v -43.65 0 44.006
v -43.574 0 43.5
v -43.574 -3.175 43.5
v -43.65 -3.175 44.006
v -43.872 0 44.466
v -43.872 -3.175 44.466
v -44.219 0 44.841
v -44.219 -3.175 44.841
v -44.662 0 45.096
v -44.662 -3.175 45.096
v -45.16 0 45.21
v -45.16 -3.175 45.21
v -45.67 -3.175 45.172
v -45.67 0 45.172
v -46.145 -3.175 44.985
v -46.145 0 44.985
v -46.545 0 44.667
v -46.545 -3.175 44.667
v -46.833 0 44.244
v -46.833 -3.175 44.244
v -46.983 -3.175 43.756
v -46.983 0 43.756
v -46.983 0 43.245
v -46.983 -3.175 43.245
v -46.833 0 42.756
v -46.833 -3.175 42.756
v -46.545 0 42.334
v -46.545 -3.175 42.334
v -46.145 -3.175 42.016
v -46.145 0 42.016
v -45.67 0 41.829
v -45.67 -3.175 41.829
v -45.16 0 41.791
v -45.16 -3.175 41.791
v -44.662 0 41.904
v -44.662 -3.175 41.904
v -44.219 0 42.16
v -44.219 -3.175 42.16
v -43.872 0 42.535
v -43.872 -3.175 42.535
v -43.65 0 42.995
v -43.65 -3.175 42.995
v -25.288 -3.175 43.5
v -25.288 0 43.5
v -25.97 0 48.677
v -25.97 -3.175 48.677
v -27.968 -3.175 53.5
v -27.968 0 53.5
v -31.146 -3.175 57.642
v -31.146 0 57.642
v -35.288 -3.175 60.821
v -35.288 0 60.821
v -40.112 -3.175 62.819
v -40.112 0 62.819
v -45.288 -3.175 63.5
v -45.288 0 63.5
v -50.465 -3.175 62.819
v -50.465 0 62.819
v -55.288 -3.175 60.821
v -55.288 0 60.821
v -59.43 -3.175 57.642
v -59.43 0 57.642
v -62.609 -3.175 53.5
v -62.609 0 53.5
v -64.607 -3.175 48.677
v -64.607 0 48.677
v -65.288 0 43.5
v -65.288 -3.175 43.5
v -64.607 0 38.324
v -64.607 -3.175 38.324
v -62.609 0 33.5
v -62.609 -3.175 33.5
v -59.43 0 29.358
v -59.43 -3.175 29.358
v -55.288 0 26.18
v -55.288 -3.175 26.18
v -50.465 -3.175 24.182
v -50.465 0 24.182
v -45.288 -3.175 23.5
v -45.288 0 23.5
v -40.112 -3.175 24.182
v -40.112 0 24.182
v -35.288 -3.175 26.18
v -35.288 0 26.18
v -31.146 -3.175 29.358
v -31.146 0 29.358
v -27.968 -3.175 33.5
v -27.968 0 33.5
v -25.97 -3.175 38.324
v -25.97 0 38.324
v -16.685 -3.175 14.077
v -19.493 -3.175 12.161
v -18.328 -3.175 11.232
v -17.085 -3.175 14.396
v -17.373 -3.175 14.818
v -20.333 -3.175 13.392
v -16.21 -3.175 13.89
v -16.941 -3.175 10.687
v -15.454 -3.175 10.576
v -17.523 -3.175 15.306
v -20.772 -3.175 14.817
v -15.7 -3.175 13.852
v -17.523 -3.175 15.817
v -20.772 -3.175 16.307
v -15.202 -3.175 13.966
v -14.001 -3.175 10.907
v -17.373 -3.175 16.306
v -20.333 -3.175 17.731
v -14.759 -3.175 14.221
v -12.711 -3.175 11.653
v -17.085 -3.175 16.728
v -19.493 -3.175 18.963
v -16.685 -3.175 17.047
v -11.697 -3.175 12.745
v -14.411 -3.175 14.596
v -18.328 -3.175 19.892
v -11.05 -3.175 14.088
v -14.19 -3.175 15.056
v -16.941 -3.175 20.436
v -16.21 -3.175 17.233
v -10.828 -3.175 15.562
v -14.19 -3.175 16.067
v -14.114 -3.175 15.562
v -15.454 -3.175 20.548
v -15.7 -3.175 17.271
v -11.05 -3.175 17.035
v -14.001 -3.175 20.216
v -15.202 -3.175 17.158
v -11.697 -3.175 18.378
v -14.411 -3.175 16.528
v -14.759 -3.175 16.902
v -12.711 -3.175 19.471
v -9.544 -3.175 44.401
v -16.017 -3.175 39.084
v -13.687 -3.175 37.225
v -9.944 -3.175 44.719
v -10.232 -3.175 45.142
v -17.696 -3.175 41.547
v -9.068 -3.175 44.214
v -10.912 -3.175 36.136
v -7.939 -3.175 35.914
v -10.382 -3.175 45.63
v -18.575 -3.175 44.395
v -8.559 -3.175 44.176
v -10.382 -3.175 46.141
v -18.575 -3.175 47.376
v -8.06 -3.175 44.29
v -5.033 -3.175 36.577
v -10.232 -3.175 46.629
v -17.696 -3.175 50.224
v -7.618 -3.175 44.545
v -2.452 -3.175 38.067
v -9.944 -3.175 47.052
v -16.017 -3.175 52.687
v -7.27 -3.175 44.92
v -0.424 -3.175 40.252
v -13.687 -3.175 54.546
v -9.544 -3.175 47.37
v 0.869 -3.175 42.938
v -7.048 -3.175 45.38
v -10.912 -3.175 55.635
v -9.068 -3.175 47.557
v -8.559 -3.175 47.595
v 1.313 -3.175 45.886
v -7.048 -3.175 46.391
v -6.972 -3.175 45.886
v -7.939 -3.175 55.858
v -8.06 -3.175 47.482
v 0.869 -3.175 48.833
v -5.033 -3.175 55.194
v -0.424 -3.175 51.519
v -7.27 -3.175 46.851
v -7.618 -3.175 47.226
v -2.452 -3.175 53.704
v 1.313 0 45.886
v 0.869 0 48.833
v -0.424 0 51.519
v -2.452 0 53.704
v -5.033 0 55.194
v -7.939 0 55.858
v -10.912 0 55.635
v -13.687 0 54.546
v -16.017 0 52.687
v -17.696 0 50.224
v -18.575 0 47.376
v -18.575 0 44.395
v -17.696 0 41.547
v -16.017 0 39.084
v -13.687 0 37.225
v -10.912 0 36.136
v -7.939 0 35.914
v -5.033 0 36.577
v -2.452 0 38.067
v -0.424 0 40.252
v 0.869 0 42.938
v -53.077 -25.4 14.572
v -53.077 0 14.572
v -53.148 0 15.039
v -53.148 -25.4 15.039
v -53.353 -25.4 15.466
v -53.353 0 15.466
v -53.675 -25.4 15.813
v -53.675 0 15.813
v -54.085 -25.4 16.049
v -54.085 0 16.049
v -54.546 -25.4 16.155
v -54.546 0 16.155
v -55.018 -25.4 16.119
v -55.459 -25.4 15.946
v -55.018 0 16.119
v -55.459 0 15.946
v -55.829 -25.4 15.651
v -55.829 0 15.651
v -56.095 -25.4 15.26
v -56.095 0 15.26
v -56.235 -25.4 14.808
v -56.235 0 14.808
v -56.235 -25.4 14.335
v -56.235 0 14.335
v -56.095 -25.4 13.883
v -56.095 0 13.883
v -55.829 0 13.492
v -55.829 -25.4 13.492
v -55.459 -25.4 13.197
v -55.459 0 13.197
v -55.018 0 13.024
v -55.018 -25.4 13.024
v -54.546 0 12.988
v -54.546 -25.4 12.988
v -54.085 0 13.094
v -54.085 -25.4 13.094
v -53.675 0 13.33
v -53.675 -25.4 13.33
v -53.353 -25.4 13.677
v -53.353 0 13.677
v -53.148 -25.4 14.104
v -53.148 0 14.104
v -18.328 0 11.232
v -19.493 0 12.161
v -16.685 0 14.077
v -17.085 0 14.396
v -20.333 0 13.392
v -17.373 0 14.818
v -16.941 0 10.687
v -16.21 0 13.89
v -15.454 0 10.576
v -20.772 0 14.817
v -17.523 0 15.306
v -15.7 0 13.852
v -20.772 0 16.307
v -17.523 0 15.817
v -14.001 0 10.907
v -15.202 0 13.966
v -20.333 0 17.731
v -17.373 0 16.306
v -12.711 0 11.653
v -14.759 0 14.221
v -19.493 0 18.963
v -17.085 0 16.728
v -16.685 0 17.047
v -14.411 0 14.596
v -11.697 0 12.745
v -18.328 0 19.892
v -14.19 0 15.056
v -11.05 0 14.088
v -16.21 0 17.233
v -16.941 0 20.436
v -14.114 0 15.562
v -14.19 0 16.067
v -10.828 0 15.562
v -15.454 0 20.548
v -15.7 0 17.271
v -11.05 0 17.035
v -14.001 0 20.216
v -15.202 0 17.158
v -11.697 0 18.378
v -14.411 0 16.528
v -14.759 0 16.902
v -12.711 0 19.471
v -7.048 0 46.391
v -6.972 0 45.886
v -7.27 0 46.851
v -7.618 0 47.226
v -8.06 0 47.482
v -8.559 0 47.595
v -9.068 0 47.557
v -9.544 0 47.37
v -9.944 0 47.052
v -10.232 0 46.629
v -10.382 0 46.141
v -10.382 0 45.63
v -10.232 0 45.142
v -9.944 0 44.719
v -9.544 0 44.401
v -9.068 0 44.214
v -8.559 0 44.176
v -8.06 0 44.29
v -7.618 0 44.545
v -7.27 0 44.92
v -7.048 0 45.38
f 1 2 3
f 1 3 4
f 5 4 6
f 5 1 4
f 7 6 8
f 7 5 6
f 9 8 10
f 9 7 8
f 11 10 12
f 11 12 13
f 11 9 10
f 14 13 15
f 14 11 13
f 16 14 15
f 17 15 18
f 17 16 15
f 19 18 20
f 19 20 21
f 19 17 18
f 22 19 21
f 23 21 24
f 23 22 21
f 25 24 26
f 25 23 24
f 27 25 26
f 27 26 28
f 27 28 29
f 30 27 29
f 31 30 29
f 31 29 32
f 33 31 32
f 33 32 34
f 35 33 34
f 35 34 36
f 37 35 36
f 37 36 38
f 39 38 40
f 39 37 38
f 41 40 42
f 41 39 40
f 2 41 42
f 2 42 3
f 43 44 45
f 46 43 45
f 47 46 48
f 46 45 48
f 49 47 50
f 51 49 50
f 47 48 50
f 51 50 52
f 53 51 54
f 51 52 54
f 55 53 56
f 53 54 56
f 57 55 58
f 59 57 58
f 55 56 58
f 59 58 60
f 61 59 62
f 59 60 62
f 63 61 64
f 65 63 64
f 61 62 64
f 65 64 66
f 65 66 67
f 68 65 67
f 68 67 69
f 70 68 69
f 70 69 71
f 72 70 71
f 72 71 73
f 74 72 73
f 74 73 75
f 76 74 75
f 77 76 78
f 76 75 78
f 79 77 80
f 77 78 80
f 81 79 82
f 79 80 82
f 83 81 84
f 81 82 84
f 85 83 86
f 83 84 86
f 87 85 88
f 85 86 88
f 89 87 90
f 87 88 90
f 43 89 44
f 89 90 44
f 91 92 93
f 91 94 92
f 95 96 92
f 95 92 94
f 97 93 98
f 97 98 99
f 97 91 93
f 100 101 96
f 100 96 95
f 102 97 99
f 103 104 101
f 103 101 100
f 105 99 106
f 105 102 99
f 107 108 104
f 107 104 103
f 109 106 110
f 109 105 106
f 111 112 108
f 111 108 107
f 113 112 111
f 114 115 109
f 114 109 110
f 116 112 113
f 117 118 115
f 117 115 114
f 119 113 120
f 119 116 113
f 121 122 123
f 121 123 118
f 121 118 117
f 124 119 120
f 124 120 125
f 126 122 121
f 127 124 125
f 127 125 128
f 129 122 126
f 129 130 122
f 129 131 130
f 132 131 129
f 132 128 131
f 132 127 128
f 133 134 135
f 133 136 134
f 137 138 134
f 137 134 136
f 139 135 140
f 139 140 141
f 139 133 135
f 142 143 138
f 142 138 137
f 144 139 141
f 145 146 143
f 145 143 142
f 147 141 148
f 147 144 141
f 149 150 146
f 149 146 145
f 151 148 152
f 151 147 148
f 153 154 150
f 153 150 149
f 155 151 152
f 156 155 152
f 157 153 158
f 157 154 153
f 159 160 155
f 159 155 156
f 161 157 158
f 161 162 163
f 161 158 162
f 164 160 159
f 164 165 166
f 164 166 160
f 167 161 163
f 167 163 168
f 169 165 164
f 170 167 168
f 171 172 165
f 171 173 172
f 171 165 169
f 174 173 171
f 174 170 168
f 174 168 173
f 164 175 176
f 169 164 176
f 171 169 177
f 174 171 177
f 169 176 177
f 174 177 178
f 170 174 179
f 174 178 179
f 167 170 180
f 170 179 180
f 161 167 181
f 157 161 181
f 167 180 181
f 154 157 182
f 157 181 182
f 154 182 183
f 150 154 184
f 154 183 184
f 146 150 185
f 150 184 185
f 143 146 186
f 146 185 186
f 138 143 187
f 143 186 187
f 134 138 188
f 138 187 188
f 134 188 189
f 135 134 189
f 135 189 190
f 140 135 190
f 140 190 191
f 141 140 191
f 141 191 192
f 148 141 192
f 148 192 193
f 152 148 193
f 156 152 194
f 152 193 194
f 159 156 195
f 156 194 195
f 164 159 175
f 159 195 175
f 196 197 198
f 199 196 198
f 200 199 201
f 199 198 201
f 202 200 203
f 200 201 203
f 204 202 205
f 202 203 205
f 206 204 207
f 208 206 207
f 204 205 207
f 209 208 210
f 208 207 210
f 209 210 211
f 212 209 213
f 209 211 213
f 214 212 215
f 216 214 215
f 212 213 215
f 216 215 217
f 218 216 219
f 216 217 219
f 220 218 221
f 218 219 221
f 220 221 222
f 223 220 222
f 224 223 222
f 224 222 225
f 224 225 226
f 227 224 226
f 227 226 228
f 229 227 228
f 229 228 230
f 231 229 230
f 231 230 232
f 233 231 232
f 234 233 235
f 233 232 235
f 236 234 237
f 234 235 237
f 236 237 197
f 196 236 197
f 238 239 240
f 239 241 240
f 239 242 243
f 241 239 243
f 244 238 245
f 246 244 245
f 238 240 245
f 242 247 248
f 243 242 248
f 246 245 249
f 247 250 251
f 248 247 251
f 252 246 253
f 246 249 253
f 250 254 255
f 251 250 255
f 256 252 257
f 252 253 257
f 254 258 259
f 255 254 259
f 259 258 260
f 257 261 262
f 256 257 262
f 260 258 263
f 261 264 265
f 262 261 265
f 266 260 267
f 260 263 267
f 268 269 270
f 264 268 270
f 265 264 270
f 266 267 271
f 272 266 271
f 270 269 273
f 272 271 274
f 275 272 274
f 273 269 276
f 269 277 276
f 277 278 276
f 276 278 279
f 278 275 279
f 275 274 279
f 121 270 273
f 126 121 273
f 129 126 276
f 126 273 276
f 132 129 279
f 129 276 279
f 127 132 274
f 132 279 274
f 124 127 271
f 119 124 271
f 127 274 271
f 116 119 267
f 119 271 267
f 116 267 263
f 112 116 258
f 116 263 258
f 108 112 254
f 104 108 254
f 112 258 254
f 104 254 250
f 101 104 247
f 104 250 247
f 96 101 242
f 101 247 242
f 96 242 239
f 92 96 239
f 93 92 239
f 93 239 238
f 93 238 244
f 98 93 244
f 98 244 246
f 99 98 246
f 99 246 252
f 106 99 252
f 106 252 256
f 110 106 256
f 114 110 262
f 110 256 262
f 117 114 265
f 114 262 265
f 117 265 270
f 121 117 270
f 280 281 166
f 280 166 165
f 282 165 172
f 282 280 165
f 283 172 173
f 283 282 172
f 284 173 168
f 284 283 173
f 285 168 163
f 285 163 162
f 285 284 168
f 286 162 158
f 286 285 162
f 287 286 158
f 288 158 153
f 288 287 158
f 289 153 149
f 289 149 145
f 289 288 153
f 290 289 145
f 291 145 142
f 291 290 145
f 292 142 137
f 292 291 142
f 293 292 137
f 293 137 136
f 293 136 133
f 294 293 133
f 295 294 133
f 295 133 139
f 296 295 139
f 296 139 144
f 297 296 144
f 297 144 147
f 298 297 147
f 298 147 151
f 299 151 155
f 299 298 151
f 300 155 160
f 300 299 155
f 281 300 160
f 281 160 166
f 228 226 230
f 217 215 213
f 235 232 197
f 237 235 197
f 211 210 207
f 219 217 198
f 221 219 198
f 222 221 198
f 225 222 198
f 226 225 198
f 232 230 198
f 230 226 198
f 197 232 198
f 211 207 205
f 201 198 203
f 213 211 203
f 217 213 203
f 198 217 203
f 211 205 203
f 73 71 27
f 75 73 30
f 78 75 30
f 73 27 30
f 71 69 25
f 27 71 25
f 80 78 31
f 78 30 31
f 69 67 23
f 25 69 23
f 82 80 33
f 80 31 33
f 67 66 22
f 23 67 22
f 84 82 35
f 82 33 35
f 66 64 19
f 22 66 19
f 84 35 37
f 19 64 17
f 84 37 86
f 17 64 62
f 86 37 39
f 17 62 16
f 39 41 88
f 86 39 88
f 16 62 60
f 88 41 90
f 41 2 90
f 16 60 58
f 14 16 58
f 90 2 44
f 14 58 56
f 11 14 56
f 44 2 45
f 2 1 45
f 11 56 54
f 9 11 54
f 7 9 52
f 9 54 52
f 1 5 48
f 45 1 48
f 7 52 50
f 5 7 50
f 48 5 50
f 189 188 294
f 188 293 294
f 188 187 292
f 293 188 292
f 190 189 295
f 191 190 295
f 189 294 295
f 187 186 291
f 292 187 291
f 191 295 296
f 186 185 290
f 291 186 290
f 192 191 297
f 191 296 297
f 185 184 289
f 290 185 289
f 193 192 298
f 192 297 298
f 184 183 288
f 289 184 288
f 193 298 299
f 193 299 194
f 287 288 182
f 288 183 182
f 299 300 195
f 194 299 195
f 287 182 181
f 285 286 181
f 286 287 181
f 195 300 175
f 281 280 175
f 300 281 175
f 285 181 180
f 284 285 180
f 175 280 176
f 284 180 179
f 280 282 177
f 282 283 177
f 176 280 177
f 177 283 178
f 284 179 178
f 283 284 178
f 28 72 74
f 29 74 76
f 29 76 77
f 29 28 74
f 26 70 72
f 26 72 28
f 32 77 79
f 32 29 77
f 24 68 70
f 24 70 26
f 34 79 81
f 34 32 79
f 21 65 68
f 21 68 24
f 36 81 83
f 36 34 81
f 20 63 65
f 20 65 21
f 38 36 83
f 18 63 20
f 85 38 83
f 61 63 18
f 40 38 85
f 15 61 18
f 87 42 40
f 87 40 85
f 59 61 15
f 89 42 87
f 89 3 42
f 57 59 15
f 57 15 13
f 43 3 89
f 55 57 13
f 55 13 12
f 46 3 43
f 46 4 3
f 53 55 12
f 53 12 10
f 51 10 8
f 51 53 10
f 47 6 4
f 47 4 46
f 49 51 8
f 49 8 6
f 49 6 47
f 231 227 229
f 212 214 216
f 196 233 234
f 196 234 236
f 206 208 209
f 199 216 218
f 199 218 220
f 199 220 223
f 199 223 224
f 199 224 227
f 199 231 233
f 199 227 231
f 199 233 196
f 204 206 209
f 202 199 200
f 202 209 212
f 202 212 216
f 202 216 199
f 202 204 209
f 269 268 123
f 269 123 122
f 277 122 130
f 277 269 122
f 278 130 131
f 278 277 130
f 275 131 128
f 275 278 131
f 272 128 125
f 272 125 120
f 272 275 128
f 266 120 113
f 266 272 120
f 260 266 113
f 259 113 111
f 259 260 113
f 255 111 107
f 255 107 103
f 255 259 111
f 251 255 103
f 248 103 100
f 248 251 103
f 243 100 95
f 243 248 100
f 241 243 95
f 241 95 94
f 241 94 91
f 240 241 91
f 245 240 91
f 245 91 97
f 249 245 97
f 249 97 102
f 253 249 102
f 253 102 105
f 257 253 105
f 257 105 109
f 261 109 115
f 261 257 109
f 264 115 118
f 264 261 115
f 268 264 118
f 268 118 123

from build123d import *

# Parameters (mm, degrees)
F0_R     = 20
F0_R_2   = 1.7145
F1_DEPTH = 3.175
F2_R     = 10
F2_R_2   = 1.7145
F3_DEPTH = 3.175
F4_R     = 5
F4_R_2   = 1.7145
F5_DEPTH = 3.175
F6_R     = 1.5875
F7_DEPTH = 25.4


# Not quite as in the source:
# - a length typed as a fraction of an inch, garbled in the dataset ("3 / 203.2 mm" for 3/8 in), is restored


with BuildPart() as f1:
    # F0 (on Front) → F1 (new body)
    with BuildSketch(Plane.XZ):
        with Locations((-45.2881418169, 43.5003638268)):
            Circle(F0_R)
        with Locations((-45.2881418169, 43.5003638268)):
            Circle(F0_R_2, mode=Mode.SUBTRACT)
    extrude(amount=F1_DEPTH)


with BuildPart() as f3:
    # F2 (on Front) → F3 (new body)
    with BuildSketch(Plane.XZ):
        with Locations((-8.6867948994, 45.8855852485)):
            Circle(F2_R)
        with Locations((-8.6867948994, 45.8855852485)):
            Circle(F2_R_2, mode=Mode.SUBTRACT)
    extrude(amount=F3_DEPTH)


with BuildPart() as f5:
    # F4 (on Front) → F5 (new body)
    with BuildSketch(Plane.XZ):
        with Locations((-15.8280301839, 15.561719425)):
            Circle(F4_R)
        with Locations((-15.8280301839, 15.561719425)):
            Circle(F4_R_2, mode=Mode.SUBTRACT)
    extrude(amount=F5_DEPTH)


with BuildPart() as f7:
    # F6 (on Front) → F7 (new body)
    with BuildSketch(Plane.XZ):
        with Locations((-54.6649806201, 14.5715419203)):
            Circle(F6_R)
    extrude(amount=F7_DEPTH)


solid = Compound([f1.part, f3.part, f5.part, f7.part])
